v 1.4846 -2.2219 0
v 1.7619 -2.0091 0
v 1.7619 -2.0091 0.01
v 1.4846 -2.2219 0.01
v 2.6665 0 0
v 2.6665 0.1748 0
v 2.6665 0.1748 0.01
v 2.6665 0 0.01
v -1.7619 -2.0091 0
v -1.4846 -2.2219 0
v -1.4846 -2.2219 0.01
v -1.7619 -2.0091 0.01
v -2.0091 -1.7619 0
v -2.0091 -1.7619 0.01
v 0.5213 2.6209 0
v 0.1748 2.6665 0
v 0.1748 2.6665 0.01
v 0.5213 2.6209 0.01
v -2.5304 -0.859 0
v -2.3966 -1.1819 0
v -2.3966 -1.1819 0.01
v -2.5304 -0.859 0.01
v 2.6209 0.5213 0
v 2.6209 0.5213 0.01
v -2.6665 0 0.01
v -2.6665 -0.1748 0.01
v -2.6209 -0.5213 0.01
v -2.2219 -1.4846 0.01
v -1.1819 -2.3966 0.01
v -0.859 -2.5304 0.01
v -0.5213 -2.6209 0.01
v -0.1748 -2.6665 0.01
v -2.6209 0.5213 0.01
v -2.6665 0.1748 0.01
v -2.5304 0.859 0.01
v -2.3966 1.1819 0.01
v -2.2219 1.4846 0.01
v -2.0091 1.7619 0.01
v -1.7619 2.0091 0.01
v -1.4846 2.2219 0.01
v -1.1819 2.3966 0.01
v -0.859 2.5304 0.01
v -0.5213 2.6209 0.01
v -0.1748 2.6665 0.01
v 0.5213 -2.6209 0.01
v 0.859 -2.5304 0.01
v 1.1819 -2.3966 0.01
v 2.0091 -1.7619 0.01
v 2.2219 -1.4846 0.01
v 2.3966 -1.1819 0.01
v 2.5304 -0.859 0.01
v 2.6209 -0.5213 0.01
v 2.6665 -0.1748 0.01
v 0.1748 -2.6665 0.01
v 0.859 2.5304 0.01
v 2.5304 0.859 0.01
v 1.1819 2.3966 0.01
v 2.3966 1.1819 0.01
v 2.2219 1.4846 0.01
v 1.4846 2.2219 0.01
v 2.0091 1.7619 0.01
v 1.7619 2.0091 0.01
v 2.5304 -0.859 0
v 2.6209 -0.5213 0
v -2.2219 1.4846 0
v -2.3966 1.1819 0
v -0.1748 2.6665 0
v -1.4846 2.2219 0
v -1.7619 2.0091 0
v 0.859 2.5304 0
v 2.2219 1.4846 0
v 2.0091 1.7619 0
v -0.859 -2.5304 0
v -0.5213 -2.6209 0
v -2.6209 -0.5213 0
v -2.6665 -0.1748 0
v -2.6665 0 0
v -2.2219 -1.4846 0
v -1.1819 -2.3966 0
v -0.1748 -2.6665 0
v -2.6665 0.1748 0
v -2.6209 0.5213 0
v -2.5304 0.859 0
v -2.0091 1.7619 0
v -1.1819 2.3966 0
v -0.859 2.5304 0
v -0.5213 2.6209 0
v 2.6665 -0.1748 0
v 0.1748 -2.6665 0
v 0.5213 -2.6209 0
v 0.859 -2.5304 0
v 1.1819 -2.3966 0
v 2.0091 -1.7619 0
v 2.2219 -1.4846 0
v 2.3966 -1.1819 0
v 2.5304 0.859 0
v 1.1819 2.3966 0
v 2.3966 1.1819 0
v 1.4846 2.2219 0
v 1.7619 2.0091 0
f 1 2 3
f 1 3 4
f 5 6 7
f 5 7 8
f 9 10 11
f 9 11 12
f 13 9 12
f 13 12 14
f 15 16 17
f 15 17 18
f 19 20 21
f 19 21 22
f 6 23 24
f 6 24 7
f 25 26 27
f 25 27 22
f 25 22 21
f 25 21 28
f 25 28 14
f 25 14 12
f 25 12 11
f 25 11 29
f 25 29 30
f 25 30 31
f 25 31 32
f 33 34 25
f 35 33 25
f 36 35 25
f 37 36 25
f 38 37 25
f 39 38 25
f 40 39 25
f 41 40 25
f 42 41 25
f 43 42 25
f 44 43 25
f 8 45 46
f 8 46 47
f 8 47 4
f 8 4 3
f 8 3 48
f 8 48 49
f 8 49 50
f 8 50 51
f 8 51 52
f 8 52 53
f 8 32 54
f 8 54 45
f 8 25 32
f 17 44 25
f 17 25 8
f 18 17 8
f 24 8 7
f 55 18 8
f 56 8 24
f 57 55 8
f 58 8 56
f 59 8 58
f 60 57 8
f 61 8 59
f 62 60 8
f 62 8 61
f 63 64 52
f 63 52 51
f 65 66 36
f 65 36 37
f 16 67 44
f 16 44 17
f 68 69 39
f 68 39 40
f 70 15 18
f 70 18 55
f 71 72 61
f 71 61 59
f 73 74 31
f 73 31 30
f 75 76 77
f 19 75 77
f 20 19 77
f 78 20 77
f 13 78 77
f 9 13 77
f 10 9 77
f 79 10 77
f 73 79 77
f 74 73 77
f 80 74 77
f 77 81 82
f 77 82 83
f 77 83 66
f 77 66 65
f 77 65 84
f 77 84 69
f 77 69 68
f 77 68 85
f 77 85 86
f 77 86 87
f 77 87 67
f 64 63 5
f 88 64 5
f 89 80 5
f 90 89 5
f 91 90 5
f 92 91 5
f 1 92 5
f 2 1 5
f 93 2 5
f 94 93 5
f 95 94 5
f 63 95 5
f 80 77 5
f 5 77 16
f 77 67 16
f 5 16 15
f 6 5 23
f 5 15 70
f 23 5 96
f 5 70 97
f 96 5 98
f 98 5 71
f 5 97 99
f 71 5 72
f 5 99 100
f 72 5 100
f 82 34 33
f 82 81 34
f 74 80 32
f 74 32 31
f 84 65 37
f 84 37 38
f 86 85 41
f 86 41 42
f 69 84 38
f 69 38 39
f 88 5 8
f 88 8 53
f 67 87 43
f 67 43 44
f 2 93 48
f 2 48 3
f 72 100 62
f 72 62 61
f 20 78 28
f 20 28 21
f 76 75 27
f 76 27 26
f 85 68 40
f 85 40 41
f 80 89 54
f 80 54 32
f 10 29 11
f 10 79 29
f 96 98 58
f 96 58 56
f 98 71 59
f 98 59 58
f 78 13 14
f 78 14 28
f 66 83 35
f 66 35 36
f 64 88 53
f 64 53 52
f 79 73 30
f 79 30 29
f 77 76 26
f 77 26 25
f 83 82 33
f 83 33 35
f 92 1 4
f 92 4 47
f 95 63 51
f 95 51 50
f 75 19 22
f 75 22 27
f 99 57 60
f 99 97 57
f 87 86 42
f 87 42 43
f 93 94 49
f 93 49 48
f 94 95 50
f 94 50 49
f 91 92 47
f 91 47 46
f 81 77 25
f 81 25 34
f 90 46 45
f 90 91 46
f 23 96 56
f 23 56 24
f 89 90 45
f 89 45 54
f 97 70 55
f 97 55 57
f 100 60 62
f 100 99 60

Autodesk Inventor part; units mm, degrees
ref_plane "YZ Plane" through (0, 0, 0) normal (1, 0, 0) x (0, 1, 0)
ref_plane "XZ Plane" through (0, 0, 0) normal (0, 1, 0) x (-1, 0, 0)
ref_plane "XY Plane" through (0, 0, 0) normal (0, 0, 1) x (1, 0, 0)
sketch "Wave_hole_3x7-singleSided, Hole_352" plane through (0, 0, 0) normal (0, 0, 1) x (1, 0, 0)
  line L0 (0.5213, 2.6209) -> (0.859, 2.5304)
  line L1 (0.859, 2.5304) -> (1.1819, 2.3966)
  line L2 (1.1819, 2.3966) -> (1.4846, 2.2219)
  line L3 (1.4846, 2.2219) -> (1.7619, 2.0091)
  line L4 (1.7619, 2.0091) -> (2.0091, 1.7619)
  line L5 (2.0091, 1.7619) -> (2.2219, 1.4846)
  line L6 (2.2219, 1.4846) -> (2.3966, 1.1819)
  line L7 (2.3966, 1.1819) -> (2.5304, 0.859)
  line L8 (2.5304, 0.859) -> (2.6209, 0.5213)
  line L9 (2.6209, 0.5213) -> (2.6665, 0.1748)
  line L10 (2.6665, 0.1748) -> (2.6665, 0)
  line L11 (2.6665, 0) -> (2.6665, -0.1748)
  line L12 (2.6665, -0.1748) -> (2.6209, -0.5213)
  line L13 (2.6209, -0.5213) -> (2.5304, -0.859)
  line L14 (2.5304, -0.859) -> (2.3966, -1.1819)
  line L15 (2.3966, -1.1819) -> (2.2219, -1.4846)
  line L16 (2.2219, -1.4846) -> (2.0091, -1.7619)
  line L17 (2.0091, -1.7619) -> (1.7619, -2.0091)
  line L18 (1.7619, -2.0091) -> (1.4846, -2.2219)
  line L19 (1.4846, -2.2219) -> (1.1819, -2.3966)
  line L20 (1.1819, -2.3966) -> (0.859, -2.5304)
  line L21 (0.859, -2.5304) -> (0.5213, -2.6209)
  line L22 (0.5213, -2.6209) -> (0.1748, -2.6665)
  line L23 (0.1748, -2.6665) -> (-0.1748, -2.6665)
  line L24 (-0.1748, -2.6665) -> (-0.5213, -2.6209)
  line L25 (-0.5213, -2.6209) -> (-0.859, -2.5304)
  line L26 (-0.859, -2.5304) -> (-1.1819, -2.3966)
  line L27 (-1.1819, -2.3966) -> (-1.4846, -2.2219)
  line L28 (-1.4846, -2.2219) -> (-1.7619, -2.0091)
  line L29 (-1.7619, -2.0091) -> (-2.0091, -1.7619)
  line L30 (-2.0091, -1.7619) -> (-2.2219, -1.4846)
  line L31 (-2.2219, -1.4846) -> (-2.3966, -1.1819)
  line L32 (-2.3966, -1.1819) -> (-2.5304, -0.859)
  line L33 (-2.5304, -0.859) -> (-2.6209, -0.5213)
  line L34 (-2.6209, -0.5213) -> (-2.6665, -0.1748)
  line L35 (-2.6665, -0.1748) -> (-2.6665, 0)
  line L36 (-2.6665, 0) -> (-2.6665, 0.1748)
  line L37 (-2.6665, 0.1748) -> (-2.6209, 0.5213)
  line L38 (-2.6209, 0.5213) -> (-2.5304, 0.859)
  line L39 (-2.5304, 0.859) -> (-2.3966, 1.1819)
  line L40 (-2.3966, 1.1819) -> (-2.2219, 1.4846)
  line L41 (-2.2219, 1.4846) -> (-2.0091, 1.7619)
  line L42 (-2.0091, 1.7619) -> (-1.7619, 2.0091)
  line L43 (-1.7619, 2.0091) -> (-1.4846, 2.2219)
  line L44 (-1.4846, 2.2219) -> (-1.1819, 2.3966)
  line L45 (-1.1819, 2.3966) -> (-0.859, 2.5304)
  line L46 (-0.859, 2.5304) -> (-0.5213, 2.6209)
  line L47 (-0.5213, 2.6209) -> (-0.1748, 2.6665)
  line L48 (-0.1748, 2.6665) -> (0.1748, 2.6665)
  line L49 (0.1748, 2.6665) -> (0.5213, 2.6209)
extrude "Extrusion1" add sketch "Wave_hole_3x7-singleSided, Hole_352" along normal blind 0.01
properties part number "Hole"
